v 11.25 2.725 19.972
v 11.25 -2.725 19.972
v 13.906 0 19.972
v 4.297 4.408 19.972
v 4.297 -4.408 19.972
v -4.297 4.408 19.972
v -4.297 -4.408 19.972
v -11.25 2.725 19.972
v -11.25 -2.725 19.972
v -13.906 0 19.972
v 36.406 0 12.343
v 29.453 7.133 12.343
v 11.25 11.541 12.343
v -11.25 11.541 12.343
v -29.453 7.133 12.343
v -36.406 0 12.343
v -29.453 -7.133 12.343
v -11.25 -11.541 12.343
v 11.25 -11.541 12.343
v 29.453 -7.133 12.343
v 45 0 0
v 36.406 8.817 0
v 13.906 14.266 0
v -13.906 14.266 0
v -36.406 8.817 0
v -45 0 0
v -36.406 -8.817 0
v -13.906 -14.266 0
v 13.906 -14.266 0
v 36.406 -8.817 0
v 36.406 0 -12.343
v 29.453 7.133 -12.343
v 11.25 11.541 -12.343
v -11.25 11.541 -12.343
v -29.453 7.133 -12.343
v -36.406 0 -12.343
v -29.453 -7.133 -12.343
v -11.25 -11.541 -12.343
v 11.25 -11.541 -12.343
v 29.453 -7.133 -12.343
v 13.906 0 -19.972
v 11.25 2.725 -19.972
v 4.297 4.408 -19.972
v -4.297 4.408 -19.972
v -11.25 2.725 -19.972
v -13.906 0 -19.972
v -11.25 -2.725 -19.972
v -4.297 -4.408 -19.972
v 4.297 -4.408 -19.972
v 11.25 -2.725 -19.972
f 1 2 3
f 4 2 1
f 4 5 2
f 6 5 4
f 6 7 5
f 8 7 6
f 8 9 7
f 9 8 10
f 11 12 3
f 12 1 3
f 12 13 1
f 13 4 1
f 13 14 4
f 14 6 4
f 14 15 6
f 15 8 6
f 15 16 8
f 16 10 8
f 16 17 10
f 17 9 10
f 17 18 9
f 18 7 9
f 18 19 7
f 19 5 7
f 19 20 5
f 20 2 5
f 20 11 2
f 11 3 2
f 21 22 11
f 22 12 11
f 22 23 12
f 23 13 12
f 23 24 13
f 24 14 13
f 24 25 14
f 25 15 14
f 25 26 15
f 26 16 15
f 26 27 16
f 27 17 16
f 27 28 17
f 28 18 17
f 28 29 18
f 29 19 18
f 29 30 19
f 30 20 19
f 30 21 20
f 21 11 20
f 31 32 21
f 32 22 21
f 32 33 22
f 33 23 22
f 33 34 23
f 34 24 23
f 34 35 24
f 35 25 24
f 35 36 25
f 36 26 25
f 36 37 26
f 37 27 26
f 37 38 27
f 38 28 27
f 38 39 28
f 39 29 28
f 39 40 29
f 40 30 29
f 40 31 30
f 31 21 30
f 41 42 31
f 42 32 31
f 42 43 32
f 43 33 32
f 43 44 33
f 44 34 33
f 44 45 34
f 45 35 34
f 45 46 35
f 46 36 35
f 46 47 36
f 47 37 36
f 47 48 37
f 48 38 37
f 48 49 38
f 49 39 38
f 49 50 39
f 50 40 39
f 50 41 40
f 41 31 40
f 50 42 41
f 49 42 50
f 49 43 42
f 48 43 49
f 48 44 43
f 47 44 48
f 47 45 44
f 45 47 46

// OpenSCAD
// Generated by SolidPython 1.0.1 on 2020-07-29 00:46:51


scale(v = [15, 5, 7]) {
	sphere(r = 3);
}
/***********************************************
*********      SolidPython code:      **********
************************************************
 
# import packages: SolidPython
from solid import *
from solid.utils import *
from itertools import chain, combinations, permutations


class Resize:

    def __init__(self, scad_file):
        self.scad_file = scad_file
        #self.scad_file = import_scad(scad_file)
        # cone/cylinder param:
        self.r1 = 0
        self.r2 = 0
        self.h = 0
        # rectangular prism param:
        self.w = 0
        self.l = 0
        # ellipse param:
        self.r = 0

    # import OpenScad code (file name corresponds to shape)


    # classify shape + parameters
    def assign(self, param1, param2, param3):
        if self.scad_file == 'cone.scad':
            self.r1 = param1
            self.r2 = param2
            self.h = param3
        elif self.scad_file == 'cylinder.scad':
            self.r1 = param1
            self.r2 = param2
            self.h = param3
        elif self.scad_file == 'rectangularPrism.scad':
            self.h = param1
            self.l = param2
            self.w = param3
        else:
            self.r = param1
            self.h = param2

    # resize parameters
    def iterate(self):
        x = range(3, 20, 2)
        i = 1
        if self.scad_file == 'cone.scad':
            tempList = list(permutations(x, 2))
            for temp in tempList:
                param1 = temp[0]
                param2 = temp[1]
                filepath = 'produced_scad_files/' + 'cone' + str(param1) + '_' + str(param2) + '_' + '.scad'
                scad_render_to_file(cylinder(h=param1, r1=param2, r2=0), filepath)

        elif self.scad_file == 'cylinder.scad':
            tempList = list(permutations(x, 3))
            for temp in tempList:
                param1 = temp[0]
                param2 = temp[1]
                filepath = 'produced_scad_files/' + 'cylinder' + str(param1) + '_' + str(param2) + '_' + '.scad'
                scad_render_to_file(cylinder(h=param1, r1=param2, r2=param2), filepath)

        elif self.scad_file == 'rectangularPrism.scad':
            tempList = list(permutations(x, 3))
            for temp in tempList:
                param1 = temp[0]
                param2 = temp[1]
                param3 = temp[2]
                filepath = 'produced_scad_files/' + 'rectangularPrism' + str(param1) + '_' + str(param2) + '_' + str(
                    param3) + '.scad'
                scad_render_to_file(cube(size=(param1, param2, param3)), filepath)

        elif self.scad_file == 'ellipse.scad':
            tempList = list(permutations(x, 4))
            for temp in tempList:
                param1 = temp[0]
                param2 = temp[1]
                param3 = temp[2]
                param4 = temp[3]
                filepath = 'produced_scad_files/' + 'ellipse' + str(param1) + '_' + str(param2) + '_' + str(param3) + '_' + str(param4) + '.scad'
                scad_render_to_file(scale([param1, param2, param3])(sphere(r=param4)), filepath)

    def render_to_scadfile(self):
        scad_render_to_file(scad, 'example.scad') 
 
************************************************/
